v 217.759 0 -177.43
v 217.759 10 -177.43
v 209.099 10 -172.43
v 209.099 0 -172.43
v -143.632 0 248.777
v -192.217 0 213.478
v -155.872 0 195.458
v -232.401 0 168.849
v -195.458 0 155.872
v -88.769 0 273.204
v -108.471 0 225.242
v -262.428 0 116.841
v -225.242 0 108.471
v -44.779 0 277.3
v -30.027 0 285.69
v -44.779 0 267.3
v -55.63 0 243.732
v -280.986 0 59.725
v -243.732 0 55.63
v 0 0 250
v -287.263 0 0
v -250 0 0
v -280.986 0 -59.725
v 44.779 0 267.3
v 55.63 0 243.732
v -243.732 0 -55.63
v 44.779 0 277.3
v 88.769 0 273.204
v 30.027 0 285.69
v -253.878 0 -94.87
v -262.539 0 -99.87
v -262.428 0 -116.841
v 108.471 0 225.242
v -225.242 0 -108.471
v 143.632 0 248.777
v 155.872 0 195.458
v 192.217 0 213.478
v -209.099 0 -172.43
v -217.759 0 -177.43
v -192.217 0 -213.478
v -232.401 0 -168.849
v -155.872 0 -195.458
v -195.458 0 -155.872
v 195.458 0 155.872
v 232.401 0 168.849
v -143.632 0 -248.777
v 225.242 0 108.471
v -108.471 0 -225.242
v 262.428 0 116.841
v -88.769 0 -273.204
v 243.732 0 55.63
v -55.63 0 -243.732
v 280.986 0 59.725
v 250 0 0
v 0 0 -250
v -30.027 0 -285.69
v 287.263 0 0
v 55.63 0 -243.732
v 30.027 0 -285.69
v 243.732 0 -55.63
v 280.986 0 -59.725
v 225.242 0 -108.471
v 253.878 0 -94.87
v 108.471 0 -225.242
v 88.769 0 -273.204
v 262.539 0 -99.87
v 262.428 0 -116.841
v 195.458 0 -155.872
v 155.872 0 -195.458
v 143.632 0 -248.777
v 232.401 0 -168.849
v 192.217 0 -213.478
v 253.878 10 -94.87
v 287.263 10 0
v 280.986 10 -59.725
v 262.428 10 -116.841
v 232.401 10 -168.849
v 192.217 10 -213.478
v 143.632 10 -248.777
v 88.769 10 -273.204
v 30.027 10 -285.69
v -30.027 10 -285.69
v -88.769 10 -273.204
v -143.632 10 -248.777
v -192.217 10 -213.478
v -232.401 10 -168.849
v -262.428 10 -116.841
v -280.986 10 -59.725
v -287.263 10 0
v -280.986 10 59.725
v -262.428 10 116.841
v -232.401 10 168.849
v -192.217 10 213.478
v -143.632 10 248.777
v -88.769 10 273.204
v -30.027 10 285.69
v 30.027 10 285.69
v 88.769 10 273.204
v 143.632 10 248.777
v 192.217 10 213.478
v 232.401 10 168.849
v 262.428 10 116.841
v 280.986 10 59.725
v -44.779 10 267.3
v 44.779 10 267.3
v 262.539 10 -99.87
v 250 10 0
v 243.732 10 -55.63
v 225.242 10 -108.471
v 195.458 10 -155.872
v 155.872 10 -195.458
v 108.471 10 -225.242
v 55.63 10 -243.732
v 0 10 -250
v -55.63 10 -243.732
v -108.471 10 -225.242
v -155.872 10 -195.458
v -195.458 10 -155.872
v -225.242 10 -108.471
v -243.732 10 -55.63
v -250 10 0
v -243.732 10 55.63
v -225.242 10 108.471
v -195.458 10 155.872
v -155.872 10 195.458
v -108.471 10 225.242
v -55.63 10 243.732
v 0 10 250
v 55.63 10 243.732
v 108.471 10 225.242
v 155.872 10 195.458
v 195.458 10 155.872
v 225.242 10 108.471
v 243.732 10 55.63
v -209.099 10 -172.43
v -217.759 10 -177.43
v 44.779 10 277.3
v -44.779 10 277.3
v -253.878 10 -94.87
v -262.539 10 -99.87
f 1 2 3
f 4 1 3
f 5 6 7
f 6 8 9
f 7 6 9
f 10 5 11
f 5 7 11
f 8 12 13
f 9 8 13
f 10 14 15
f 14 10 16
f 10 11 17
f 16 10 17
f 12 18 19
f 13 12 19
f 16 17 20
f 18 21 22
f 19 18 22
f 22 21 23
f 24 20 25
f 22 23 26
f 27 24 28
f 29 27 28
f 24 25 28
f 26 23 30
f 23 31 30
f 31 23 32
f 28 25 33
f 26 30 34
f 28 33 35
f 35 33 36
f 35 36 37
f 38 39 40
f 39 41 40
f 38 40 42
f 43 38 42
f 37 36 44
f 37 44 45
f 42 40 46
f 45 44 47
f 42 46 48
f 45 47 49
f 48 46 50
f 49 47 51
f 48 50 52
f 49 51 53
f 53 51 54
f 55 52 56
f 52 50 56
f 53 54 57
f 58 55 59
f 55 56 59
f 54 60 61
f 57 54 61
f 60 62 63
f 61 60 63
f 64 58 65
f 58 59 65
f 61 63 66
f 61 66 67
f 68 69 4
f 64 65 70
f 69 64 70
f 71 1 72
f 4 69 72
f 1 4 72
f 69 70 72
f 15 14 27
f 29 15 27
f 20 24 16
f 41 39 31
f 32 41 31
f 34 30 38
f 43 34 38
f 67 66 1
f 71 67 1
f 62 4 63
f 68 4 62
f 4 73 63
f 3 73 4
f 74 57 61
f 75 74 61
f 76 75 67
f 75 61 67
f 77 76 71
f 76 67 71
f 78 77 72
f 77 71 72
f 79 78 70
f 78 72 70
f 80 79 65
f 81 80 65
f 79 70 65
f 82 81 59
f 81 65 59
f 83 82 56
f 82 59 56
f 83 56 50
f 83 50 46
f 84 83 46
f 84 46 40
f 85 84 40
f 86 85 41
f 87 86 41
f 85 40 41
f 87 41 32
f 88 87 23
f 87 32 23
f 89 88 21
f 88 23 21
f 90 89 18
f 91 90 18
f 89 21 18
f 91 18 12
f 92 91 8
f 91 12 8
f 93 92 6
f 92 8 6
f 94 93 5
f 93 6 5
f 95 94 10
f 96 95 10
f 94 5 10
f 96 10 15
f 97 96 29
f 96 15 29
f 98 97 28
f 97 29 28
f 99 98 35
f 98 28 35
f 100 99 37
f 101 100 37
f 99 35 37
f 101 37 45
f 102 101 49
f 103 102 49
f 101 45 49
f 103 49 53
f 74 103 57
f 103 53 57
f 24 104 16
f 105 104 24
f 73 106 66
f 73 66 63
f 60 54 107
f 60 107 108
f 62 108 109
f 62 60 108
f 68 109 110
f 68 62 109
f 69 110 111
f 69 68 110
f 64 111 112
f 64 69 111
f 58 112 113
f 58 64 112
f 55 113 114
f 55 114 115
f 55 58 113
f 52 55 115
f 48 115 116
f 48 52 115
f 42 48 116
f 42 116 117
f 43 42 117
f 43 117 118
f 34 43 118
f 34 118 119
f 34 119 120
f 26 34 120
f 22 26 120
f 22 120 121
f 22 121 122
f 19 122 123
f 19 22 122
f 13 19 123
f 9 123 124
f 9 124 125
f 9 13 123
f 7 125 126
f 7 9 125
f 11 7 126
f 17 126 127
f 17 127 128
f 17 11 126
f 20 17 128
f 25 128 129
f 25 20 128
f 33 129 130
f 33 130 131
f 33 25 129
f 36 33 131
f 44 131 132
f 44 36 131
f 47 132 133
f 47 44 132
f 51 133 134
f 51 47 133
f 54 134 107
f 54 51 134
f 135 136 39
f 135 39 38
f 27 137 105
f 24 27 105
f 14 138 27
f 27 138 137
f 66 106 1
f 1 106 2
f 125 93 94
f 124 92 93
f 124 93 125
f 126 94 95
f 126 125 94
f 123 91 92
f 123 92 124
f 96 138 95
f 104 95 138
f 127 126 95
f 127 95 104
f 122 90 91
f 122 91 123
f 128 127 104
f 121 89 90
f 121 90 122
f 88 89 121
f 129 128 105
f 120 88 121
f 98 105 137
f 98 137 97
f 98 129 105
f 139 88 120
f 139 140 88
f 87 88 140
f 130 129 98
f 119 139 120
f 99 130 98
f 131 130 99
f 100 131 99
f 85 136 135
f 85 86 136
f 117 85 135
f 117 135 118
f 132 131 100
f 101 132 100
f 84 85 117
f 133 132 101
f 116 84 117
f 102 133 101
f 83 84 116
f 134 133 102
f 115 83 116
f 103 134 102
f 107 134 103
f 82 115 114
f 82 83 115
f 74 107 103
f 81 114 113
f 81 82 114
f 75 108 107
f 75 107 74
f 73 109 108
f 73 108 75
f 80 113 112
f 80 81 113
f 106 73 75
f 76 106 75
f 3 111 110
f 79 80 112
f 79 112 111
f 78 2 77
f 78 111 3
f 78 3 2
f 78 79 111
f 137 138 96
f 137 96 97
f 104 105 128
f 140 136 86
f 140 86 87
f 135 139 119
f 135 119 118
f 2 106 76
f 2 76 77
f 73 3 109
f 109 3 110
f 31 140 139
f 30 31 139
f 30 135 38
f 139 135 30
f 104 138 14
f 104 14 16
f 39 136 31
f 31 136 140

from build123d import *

# Parameters (mm, degrees)
SKETCH1_R           = 287.263450512
SKETCH1_R_2         = 250
BOSS_EXTRUDE1_DEPTH = 10
SKETCH2_W           = 89.558863324
SKETCH2_H           = 10
CUT_EXTRUDE1_DEPTH  = 10
CIRPATTERN1_COUNT   = 3


with BuildPart() as part:
    # Sketch1 → Boss-Extrude1 (new body)
    with BuildSketch(Plane(origin=(0, 0, 0), x_dir=(1, 0, 0), z_dir=(0, 1, 0))):
        Circle(SKETCH1_R)
        Circle(SKETCH1_R_2, mode=Mode.SUBTRACT)
    extrude(amount=BOSS_EXTRUDE1_DEPTH)

    # Sketch2 → Cut-Extrude1 (cut)
    with BuildSketch(Plane(origin=(0, 10, 0), x_dir=(1, 0, 0), z_dir=(0, 1, 0))):
        with Locations((0, -272.3)):
            Rectangle(SKETCH2_W, SKETCH2_H)
    cut_extrude1 = extrude(amount=-CUT_EXTRUDE1_DEPTH, mode=Mode.SUBTRACT)

    # CirPattern1: Cut-Extrude1 ×3 about axis
    cirpattern1_axis = Axis((0, 0, 0), (0, 1, 0))
    for i in range(1, CIRPATTERN1_COUNT):
        add(cut_extrude1.rotate(cirpattern1_axis, i * 360 / CIRPATTERN1_COUNT), mode=Mode.SUBTRACT)


solid = part.part
